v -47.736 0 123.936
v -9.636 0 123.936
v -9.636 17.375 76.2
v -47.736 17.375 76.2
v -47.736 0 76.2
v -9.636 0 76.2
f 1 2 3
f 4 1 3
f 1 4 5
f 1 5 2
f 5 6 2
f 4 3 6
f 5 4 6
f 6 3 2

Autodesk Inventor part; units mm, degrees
ref_plane "YZ Plane" through (0, 0, 0) normal (1, 0, 0) x (0, 1, 0)
ref_plane "XZ Plane" through (0, 0, 0) normal (0, 1, 0) x (-1, 0, 0)
ref_plane "XY Plane" through (0, 0, 0) normal (0, 0, 1) x (1, 0, 0)
sketch "Sketch1" plane through (0, 0, 0) normal (0, 0, 1) x (1, 0, 0)
  line L0 (38.1, 0) -> (-9.6364, 17.3746)
  line L1 (-9.6364, 17.3746) -> (-9.6364, 0)
  line L2 (-9.6364, 0) -> (38.1, 0)
  point P0 (0, 0)
  dimension "d2" = 50.8
  dimension "d4" = 70
extrude "Extrusion1" add sketch "Sketch1" along normal blind 38.1
move or copy body "Move Body1" bodies to move or copy 1 copy no rotation origin (0, 0, 0) rotation axis (0, 1, 0) rotation angle -180 translate (-19.2728, 0, 76.2)
move or copy body "Move Body2" bodies to move or copy 1 copy no rotation origin (0, 0, 0) rotation axis (0, 1, 0) rotation angle 90 translate (-85.8364, 0, 66.5636)
properties part number "70DegreeWoodHinge" material "Wood (Birch)"
